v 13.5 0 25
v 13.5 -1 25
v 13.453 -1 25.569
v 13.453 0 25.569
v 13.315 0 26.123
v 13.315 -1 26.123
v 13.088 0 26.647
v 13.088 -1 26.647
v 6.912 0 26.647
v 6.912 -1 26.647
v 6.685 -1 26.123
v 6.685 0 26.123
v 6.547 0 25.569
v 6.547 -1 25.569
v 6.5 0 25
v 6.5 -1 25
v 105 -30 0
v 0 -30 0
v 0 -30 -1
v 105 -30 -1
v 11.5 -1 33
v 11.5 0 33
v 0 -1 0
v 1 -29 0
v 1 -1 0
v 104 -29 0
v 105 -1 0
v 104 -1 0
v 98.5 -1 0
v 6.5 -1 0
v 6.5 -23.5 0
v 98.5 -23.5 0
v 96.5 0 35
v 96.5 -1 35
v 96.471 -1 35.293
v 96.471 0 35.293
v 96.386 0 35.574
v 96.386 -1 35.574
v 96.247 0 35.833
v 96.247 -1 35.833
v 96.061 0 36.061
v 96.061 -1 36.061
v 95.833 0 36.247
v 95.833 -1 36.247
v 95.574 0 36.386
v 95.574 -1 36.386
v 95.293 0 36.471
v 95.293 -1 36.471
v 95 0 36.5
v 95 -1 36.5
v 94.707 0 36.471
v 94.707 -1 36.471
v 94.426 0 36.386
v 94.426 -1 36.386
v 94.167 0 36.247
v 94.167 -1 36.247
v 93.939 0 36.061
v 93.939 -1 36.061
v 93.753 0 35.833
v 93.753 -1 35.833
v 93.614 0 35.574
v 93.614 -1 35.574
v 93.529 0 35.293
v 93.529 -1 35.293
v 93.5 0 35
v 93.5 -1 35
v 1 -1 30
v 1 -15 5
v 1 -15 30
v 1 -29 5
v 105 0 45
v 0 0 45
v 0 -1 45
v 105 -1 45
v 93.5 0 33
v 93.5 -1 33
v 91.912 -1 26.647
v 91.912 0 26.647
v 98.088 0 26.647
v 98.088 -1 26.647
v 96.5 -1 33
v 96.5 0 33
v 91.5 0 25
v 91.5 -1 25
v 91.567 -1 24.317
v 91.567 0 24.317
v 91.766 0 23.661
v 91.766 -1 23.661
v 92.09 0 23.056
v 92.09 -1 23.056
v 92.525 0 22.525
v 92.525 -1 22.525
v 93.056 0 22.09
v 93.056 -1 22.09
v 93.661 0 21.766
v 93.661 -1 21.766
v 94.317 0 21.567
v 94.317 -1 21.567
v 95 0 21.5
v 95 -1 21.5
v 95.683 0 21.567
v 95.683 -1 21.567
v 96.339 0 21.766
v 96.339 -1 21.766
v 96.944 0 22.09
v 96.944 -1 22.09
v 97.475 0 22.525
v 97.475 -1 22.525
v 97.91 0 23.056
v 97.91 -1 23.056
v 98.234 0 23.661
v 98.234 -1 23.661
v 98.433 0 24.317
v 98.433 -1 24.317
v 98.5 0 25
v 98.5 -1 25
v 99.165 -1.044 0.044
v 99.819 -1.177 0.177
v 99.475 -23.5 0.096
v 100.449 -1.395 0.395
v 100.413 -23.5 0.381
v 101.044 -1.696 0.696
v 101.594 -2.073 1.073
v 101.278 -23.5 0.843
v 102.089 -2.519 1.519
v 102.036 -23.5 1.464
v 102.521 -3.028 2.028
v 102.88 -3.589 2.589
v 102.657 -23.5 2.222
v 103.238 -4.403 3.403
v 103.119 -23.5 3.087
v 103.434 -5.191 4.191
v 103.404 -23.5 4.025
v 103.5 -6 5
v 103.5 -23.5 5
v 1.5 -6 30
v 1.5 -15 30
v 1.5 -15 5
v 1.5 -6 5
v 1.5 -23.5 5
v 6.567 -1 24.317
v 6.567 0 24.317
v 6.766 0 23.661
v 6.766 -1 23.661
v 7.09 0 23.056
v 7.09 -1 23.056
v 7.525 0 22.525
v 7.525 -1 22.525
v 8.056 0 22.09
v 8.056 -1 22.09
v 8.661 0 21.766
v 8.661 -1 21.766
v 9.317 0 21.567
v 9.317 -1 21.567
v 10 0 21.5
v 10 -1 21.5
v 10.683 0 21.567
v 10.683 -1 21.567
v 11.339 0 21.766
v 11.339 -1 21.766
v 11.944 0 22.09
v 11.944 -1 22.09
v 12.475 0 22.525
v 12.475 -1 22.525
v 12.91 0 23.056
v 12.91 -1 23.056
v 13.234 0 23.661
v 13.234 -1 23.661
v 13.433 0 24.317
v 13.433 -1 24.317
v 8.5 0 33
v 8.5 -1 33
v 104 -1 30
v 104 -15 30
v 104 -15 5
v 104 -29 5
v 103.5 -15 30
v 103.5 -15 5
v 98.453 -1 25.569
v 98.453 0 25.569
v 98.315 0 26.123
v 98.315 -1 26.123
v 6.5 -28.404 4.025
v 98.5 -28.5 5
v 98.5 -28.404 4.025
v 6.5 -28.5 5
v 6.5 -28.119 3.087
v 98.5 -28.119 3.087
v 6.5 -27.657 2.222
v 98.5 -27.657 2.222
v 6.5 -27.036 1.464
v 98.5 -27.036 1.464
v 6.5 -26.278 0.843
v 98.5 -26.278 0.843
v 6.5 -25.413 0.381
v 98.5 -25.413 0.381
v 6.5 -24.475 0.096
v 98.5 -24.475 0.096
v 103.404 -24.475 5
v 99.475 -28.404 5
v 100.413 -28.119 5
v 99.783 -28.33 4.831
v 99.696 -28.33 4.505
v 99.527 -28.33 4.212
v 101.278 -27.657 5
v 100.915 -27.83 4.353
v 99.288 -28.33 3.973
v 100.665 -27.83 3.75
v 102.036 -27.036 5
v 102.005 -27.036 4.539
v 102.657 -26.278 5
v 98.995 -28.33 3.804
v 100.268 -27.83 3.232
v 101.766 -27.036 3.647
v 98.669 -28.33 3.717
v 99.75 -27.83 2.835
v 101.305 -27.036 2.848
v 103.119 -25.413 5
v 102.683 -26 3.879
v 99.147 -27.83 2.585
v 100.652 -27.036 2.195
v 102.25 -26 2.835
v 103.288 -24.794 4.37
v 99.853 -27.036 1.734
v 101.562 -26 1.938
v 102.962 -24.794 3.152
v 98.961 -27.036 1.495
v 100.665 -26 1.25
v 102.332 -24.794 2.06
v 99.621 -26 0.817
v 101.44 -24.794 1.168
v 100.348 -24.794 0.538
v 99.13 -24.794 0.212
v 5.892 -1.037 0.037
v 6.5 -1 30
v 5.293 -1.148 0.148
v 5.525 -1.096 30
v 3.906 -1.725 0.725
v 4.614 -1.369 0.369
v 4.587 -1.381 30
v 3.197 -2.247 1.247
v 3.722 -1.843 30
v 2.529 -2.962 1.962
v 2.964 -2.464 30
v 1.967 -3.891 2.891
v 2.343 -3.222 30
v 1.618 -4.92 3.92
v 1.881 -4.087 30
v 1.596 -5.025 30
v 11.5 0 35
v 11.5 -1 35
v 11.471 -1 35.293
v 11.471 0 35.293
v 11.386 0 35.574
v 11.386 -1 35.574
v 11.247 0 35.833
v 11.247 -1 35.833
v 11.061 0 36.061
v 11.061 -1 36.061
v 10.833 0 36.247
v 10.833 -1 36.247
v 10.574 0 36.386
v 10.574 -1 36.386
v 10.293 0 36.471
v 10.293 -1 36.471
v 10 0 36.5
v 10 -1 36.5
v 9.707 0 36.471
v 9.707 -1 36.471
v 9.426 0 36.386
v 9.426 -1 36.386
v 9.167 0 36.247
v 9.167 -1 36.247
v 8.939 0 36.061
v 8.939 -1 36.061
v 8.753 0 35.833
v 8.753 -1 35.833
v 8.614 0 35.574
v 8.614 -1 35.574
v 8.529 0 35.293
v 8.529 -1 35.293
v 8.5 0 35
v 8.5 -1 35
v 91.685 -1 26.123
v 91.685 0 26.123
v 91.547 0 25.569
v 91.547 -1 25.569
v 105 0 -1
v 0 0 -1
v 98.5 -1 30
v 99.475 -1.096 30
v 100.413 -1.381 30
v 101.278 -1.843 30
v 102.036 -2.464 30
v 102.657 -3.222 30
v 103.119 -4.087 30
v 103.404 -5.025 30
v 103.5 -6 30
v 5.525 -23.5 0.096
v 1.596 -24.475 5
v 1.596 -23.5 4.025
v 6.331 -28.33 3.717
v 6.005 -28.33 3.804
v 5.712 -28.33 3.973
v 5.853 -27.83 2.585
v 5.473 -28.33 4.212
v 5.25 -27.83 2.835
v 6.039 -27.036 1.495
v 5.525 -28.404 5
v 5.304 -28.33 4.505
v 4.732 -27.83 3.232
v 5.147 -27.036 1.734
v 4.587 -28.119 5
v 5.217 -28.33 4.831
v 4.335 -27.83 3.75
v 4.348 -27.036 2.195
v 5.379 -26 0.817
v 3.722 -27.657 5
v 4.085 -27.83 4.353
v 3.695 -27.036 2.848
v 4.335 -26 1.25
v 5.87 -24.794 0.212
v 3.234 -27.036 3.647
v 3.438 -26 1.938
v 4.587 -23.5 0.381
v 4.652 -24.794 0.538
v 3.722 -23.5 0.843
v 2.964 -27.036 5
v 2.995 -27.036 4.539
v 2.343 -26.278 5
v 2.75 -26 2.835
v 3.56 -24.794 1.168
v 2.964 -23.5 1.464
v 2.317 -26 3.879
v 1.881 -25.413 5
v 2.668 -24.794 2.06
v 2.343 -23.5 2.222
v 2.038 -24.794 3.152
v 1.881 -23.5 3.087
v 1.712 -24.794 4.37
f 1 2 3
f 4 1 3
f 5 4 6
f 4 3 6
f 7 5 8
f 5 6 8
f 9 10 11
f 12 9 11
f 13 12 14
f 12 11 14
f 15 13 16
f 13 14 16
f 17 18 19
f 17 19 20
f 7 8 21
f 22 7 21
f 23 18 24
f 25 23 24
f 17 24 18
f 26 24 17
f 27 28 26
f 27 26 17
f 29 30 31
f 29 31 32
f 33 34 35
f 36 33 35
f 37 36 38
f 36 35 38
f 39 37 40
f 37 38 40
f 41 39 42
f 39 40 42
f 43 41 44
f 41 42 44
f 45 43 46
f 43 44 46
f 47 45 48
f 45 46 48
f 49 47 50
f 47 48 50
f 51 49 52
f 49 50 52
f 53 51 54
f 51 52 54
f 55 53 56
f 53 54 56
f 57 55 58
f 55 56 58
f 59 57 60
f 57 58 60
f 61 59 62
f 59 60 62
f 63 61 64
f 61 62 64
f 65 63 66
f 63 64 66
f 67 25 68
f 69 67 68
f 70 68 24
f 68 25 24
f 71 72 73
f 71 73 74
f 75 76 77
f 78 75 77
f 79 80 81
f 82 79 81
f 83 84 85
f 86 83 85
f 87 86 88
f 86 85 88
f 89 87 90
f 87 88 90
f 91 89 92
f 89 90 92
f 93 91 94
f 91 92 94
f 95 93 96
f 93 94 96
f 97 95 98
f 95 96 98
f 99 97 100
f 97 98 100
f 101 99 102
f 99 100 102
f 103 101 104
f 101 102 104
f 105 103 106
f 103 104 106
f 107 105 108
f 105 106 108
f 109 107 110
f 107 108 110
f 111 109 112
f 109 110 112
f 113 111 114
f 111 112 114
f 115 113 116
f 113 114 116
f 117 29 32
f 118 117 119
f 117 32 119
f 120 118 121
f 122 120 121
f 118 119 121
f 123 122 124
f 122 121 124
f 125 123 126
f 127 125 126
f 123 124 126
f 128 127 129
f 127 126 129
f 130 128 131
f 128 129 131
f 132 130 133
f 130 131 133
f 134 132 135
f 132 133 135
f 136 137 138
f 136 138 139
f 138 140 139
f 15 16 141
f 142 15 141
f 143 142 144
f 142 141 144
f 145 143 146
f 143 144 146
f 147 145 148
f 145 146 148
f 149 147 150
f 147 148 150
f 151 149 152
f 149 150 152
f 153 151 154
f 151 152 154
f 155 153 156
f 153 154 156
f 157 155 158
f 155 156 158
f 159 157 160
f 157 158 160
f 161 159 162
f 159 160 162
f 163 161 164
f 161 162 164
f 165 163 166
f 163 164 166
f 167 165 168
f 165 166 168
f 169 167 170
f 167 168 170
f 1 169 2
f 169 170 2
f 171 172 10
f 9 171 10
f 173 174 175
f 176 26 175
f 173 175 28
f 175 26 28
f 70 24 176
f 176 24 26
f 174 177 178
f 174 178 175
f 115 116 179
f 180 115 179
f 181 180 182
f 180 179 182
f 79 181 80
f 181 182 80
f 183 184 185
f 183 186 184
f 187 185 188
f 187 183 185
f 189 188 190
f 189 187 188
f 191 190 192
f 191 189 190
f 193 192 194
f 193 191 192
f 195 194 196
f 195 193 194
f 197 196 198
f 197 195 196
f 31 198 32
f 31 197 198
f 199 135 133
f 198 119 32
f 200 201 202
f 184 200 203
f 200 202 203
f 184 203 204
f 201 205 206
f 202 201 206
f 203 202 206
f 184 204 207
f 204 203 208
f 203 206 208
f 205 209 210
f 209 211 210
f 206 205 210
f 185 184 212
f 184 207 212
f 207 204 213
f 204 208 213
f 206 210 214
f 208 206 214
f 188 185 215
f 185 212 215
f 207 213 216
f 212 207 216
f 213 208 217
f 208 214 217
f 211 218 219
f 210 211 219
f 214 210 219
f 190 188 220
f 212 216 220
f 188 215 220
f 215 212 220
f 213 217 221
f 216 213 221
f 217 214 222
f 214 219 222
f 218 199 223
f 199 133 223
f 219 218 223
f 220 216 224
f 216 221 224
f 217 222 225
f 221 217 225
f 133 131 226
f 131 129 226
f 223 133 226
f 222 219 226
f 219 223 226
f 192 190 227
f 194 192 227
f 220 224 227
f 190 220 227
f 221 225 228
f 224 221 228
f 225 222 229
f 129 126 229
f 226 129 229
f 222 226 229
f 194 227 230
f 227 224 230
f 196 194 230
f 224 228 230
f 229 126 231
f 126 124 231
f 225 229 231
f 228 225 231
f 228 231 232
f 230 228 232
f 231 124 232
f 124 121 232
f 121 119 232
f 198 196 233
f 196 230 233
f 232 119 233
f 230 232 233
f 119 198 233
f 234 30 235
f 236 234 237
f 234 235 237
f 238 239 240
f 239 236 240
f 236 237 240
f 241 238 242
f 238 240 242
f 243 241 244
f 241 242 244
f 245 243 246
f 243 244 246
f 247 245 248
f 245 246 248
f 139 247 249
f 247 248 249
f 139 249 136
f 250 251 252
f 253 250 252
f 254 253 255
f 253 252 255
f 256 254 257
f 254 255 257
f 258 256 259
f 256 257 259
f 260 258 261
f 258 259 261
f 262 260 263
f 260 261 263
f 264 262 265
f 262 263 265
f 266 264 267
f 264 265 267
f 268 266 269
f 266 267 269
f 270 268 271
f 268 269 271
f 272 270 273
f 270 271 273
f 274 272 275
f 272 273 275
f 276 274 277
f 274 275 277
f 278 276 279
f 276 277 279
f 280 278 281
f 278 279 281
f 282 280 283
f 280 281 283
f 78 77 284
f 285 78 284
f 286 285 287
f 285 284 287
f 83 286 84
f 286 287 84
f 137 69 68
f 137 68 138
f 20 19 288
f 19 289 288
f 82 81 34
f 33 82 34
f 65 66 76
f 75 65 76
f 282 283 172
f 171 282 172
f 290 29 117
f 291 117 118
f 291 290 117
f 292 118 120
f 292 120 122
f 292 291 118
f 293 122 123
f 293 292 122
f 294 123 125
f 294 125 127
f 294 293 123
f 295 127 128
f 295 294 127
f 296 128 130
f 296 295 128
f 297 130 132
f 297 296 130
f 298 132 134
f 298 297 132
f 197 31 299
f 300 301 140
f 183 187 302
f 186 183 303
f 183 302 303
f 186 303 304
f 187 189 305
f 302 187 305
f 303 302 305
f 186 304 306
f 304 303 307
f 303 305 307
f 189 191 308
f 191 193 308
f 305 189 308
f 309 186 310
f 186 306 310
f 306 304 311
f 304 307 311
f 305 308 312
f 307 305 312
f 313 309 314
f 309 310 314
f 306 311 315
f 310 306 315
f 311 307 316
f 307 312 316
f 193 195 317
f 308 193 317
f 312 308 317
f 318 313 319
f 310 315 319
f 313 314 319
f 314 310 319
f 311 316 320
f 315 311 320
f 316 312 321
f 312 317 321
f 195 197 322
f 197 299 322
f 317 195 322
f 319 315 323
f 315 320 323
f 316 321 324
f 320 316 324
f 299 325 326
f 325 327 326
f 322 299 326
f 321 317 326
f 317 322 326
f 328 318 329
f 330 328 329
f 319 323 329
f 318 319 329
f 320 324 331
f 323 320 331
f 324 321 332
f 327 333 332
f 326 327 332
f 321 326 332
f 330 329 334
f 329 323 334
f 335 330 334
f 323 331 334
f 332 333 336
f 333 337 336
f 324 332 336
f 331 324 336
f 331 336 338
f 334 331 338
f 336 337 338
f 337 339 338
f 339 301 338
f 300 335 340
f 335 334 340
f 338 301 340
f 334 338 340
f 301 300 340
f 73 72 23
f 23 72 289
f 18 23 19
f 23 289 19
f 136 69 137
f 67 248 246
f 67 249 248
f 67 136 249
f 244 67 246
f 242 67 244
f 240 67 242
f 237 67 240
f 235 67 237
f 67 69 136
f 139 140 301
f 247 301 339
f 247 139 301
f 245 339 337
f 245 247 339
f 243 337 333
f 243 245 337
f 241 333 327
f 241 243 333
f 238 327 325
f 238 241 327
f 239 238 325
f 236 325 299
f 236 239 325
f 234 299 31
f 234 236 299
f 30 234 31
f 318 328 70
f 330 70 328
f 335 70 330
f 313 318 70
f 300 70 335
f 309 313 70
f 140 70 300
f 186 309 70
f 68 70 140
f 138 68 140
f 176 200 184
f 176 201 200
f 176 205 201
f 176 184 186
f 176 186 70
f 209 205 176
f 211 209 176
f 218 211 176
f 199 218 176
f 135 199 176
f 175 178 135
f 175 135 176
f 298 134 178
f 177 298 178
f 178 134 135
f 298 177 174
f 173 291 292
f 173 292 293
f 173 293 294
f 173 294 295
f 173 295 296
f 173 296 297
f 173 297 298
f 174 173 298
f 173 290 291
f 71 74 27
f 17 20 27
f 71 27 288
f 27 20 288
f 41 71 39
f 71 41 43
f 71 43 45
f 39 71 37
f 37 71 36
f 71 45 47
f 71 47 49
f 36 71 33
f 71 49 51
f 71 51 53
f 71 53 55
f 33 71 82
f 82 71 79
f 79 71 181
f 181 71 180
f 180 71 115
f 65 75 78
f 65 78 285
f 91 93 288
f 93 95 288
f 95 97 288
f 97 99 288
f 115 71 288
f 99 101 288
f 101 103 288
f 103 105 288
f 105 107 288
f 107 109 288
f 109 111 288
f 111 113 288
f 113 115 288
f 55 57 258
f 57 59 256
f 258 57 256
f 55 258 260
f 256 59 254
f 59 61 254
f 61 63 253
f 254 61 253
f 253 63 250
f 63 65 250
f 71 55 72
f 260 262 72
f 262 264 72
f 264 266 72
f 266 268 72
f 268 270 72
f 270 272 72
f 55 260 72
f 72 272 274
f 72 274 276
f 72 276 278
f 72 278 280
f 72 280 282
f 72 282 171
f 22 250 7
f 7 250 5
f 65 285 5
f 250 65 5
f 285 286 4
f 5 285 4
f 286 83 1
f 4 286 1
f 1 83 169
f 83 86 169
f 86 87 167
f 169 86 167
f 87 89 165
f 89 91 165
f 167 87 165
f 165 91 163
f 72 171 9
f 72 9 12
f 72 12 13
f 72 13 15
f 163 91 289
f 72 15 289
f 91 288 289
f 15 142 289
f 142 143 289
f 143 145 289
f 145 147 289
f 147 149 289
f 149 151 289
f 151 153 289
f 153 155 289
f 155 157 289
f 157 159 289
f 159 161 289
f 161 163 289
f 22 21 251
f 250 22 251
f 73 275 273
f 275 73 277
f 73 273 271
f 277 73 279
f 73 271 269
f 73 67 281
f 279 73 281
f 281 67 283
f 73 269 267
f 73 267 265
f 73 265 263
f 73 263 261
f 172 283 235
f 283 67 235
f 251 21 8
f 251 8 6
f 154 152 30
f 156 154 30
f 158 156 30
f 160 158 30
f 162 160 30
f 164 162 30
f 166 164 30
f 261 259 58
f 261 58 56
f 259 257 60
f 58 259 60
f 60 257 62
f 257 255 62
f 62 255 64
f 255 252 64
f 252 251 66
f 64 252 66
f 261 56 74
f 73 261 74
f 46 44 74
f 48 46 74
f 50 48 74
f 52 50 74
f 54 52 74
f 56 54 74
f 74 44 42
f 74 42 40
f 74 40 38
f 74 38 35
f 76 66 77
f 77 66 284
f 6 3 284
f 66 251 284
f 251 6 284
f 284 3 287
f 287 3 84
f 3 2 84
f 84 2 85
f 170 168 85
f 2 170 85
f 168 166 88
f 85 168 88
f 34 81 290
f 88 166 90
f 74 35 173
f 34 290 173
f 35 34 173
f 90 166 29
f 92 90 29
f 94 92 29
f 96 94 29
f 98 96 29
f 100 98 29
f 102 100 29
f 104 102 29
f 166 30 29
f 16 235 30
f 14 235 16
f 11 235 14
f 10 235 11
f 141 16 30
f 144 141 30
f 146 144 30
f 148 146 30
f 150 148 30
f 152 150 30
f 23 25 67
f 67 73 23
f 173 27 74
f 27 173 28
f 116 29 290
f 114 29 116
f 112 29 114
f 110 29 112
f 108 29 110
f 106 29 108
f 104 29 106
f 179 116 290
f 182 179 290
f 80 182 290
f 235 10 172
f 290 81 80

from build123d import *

# Parameters (mm, degrees)
F0_W     = 102
F0_H     = 27.5
F1_DEPTH = 1
F2_DEPTH = 5
F4_DEPTH = 25
F6_DEPTH = 15
F8_DEPTH = 1
F9_R     = 4.99999
F10_R    = 4.99999


# Not quite as in the source:
# - a fillet or chamfer is up to 0.001 mm smaller than in the source, because OpenCascade refuses the exact size
# - a feature names something its author has since deleted; it is built from what else it names


with BuildPart() as f1:
    # F0 (on Top) → F1 (new body)
    with BuildSketch(Plane.XY):
        with Locations((52.5, -14.75)):
            Rectangle(F0_W, F0_H)
        Polygon((1.5, -1), (1, -1), (1, -29), (104, -29), (104, -1), (103.5, -1), (103.5, -28.5), (1.5, -28.5), align=None)
        Polygon((1, -1), (0, -1), (0, -30), (105, -30), (105, -1), (104, -1), (104, -29), (1, -29), align=None)
        Polygon((105, 0), (0, 0), (0, -1), (1, -1), (1.5, -1), (103.5, -1), (104, -1), (105, -1), align=None)
    extrude(amount=-F1_DEPTH)

    # F0 (on Top) → F2 (join)
    with BuildSketch(Plane.XY):
        Polygon((105, 0), (0, 0), (0, -1), (1, -1), (1.5, -1), (103.5, -1), (104, -1), (105, -1), align=None)
        Polygon((1.5, -1), (1, -1), (1, -29), (104, -29), (104, -1), (103.5, -1), (103.5, -28.5), (1.5, -28.5), align=None)
    extrude(amount=F2_DEPTH)

    # F3 (on face) → F4 (join)
    with BuildSketch(Plane.XY.offset(5)):
        Polygon((1, -1), (1, -15), (1.5, -15), (1.5, -1), (103.5, -1), (103.5, -15), (104, -15), (104, -1), (105, -1), (105, 0), (0, 0), (0, -1), align=None)
    extrude(amount=F4_DEPTH)

    # F5 (on face) → F6 (join)
    with BuildSketch(Plane.XY.offset(30)):
        Polygon((1.5, -1), (103.5, -1), (104, -1), (105, -1), (105, 0), (0, 0), (0, -1), (1, -1), align=None)
    extrude(amount=F6_DEPTH)

    # F7 (on face) → F8 (cut, through all)
    with BuildSketch(Plane.XZ.offset(1)):
        with BuildLine():
            Line((13.5, 25), (6.5, 25))
            ThreePointArc((6.5, 25), (10, 21.5), (13.5, 25))
        make_face()
        with BuildLine():
            ThreePointArc((6.9117647059, 26.6470588235), (6.6045012495, 25.8488746876), (6.5, 25))
            Line((6.5, 25), (6.9117647059, 26.6470588235))
        make_face()
        with BuildLine():
            Line((6.9117647059, 26.6470588235), (6.5, 25))
            Line((6.5, 25), (13.5, 25))
            Line((13.5, 25), (13.0882352941, 26.6470588235))
            ThreePointArc((13.0882352941, 26.6470588235), (10, 28.5), (6.9117647059, 26.6470588235))
        make_face()
        with BuildLine():
            Line((13.0882352941, 26.6470588235), (13.5, 25))
            ThreePointArc((13.5, 25), (13.3954987505, 25.8488746876), (13.0882352941, 26.6470588235))
        make_face()
        with BuildLine():
            Line((8.5, 33), (6.9117647059, 26.6470588235))
            ThreePointArc((6.9117647059, 26.6470588235), (10, 28.5), (13.0882352941, 26.6470588235))
            Line((13.0882352941, 26.6470588235), (11.5, 33))
            ThreePointArc((11.5, 33), (10, 31.5), (8.5, 33))
        make_face()
        with BuildLine():
            ThreePointArc((8.8819660113, 34), (8.5987414616, 33.5352331347), (8.5, 33))
            ThreePointArc((8.5, 33), (10, 31.5), (11.5, 33))
            ThreePointArc((11.5, 33), (11.4012585384, 33.5352331347), (11.1180339887, 34))
            ThreePointArc((11.1180339887, 34), (10, 33.5), (8.8819660113, 34))
        make_face()
        with BuildLine():
            Line((8.5, 35), (8.5, 33))
            ThreePointArc((8.5, 33), (8.5987414616, 33.5352331347), (8.8819660113, 34))
            ThreePointArc((8.8819660113, 34), (8.5987414616, 34.4647668653), (8.5, 35))
        make_face()
        with BuildLine():
            ThreePointArc((11.1180339887, 34), (11.4012585384, 33.5352331347), (11.5, 33))
            Line((11.5, 33), (11.5, 35))
            ThreePointArc((11.5, 35), (11.4012585384, 34.4647668653), (11.1180339887, 34))
        make_face()
        with BuildLine():
            ThreePointArc((8.5, 35), (8.5987414616, 34.4647668653), (8.8819660113, 34))
            ThreePointArc((8.8819660113, 34), (10, 34.5), (11.1180339887, 34))
            ThreePointArc((11.1180339887, 34), (11.4012585384, 34.4647668653), (11.5, 35))
            Line((11.5, 35), (8.5, 35))
        make_face()
        with BuildLine():
            ThreePointArc((11.5, 35), (10, 36.5), (8.5, 35))
            Line((8.5, 35), (11.5, 35))
        make_face()
        with BuildLine():
            Line((91.9117647059, 26.6470588235), (91.5, 25))
            ThreePointArc((91.5, 25), (95, 21.5), (98.5, 25))
            Line((98.5, 25), (98.0882352941, 26.6470588235))
            ThreePointArc((98.0882352941, 26.6470588235), (95, 28.5), (91.9117647059, 26.6470588235))
        make_face()
        with BuildLine():
            ThreePointArc((91.9117647059, 26.6470588235), (91.6045012495, 25.8488746876), (91.5, 25))
            Line((91.5, 25), (91.9117647059, 26.6470588235))
        make_face()
        with BuildLine():
            Line((98.0882352941, 26.6470588235), (98.5, 25))
            ThreePointArc((98.5, 25), (98.3954987505, 25.8488746876), (98.0882352941, 26.6470588235))
        make_face()
        with BuildLine():
            Line((93.5, 33), (91.9117647059, 26.6470588235))
            ThreePointArc((91.9117647059, 26.6470588235), (95, 28.5), (98.0882352941, 26.6470588235))
            Line((98.0882352941, 26.6470588235), (96.5, 33))
            ThreePointArc((96.5, 33), (95, 31.5), (93.5, 33))
        make_face()
        with BuildLine():
            ThreePointArc((93.8819660113, 34), (93.5987414616, 33.5352331347), (93.5, 33))
            ThreePointArc((93.5, 33), (95, 31.5), (96.5, 33))
            ThreePointArc((96.5, 33), (96.4012585384, 33.5352331347), (96.1180339887, 34))
            ThreePointArc((96.1180339887, 34), (95, 33.5), (93.8819660113, 34))
        make_face()
        with BuildLine():
            Line((93.5, 35), (93.5, 33))
            ThreePointArc((93.5, 33), (93.5987414616, 33.5352331347), (93.8819660113, 34))
            ThreePointArc((93.8819660113, 34), (93.5987414616, 34.4647668653), (93.5, 35))
        make_face()
        with BuildLine():
            ThreePointArc((96.1180339887, 34), (96.4012585384, 33.5352331347), (96.5, 33))
            Line((96.5, 33), (96.5, 35))
            ThreePointArc((96.5, 35), (96.4012585384, 34.4647668653), (96.1180339887, 34))
        make_face()
        with BuildLine():
            ThreePointArc((93.5, 35), (93.5987414616, 34.4647668653), (93.8819660113, 34))
            ThreePointArc((93.8819660113, 34), (95, 34.5), (96.1180339887, 34))
            ThreePointArc((96.1180339887, 34), (96.4012585384, 34.4647668653), (96.5, 35))
            ThreePointArc((96.5, 35), (95, 36.5), (93.5, 35))
        make_face()
        with BuildLine():
            ThreePointArc((11.1180339887, 34), (10, 34.5), (8.8819660113, 34))
            ThreePointArc((8.8819660113, 34), (10, 33.5), (11.1180339887, 34))
        make_face()
        with BuildLine():
            ThreePointArc((96.1180339887, 34), (95, 34.5), (93.8819660113, 34))
            ThreePointArc((93.8819660113, 34), (95, 33.5), (96.1180339887, 34))
        make_face()
    extrude(amount=-F8_DEPTH, mode=Mode.SUBTRACT)

    # F9 (radius 5 in the source; OpenCascade refuses exactly that, so slightly less here)
    f9_edges = [f1.edges().sort_by_distance(p)[0] for p in [
        (1.5, -14.75, 0),
        (103.5, -14.75, 0),
        (103.5, -1, 15),
        (1.5, -1, 15),
    ]]
    fillet(f9_edges, radius=F9_R)

    # F10 (radius 5 in the source; OpenCascade refuses exactly that, so slightly less here)
    f10_edges = [f1.edges().sort_by_distance(p)[0] for p in [
        (52.5, -28.5, 0),
    ]]
    fillet(f10_edges, radius=F10_R)


solid = f1.part
